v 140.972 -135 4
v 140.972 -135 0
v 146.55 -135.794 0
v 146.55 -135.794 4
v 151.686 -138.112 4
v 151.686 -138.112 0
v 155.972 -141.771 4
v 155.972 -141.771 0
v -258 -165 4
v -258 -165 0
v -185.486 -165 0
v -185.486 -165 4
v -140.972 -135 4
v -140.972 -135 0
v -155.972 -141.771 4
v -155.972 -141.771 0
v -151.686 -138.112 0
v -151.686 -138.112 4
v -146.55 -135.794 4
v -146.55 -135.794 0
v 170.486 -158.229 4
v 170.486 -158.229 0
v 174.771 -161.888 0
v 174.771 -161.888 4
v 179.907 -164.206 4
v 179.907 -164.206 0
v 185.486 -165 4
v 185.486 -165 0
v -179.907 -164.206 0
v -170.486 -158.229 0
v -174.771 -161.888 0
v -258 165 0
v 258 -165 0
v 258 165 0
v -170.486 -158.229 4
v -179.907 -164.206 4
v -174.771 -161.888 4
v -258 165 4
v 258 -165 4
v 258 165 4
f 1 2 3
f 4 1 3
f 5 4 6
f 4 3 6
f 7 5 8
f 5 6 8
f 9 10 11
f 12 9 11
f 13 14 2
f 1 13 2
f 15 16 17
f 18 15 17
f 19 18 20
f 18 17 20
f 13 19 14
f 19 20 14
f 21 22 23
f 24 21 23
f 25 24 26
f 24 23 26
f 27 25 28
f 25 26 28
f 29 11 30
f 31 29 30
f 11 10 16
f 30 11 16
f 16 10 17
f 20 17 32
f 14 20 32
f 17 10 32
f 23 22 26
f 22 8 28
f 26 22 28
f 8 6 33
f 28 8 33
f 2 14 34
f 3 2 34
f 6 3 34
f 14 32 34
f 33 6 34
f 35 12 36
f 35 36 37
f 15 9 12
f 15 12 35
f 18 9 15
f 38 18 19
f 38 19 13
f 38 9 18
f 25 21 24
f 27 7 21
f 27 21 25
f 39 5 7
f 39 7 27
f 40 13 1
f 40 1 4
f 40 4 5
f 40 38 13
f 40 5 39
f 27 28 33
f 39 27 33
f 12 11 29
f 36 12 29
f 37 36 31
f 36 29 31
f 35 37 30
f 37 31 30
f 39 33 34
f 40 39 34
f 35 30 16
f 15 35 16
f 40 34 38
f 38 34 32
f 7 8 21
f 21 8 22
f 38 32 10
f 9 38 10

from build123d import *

# Parameters (mm, degrees)
BOSS_EXTRUDE1_DEPTH = 4


with BuildPart() as part:
    # Sketch1 → Boss-Extrude1 (new body)
    with BuildSketch(Plane.XY):
        with BuildLine():
            Line((-170.485837704, -158.228756555), (-155.971675407, -141.771243445))
            ThreePointArc((-155.971675407, -141.771243445), (-149.200431962, -136.771243445), (-140.971675407, -135))
            Line((-140.971675407, -135), (140.971675407, -135))
            ThreePointArc((140.971675407, -135), (149.200431962, -136.771243445), (155.971675407, -141.771243445))
            Line((155.971675407, -141.771243445), (170.485837704, -158.228756555))
            ThreePointArc((170.485837704, -158.228756555), (177.257081148, -163.228756555), (185.485837704, -165))
            Line((185.485837704, -165), (258, -165))
            Line((258, -165), (258, 165))
            Line((258, 165), (-258, 165))
            Line((-258, 165), (-258, -165))
            Line((-258, -165), (-185.485837704, -165))
            ThreePointArc((-185.485837704, -165), (-177.257081148, -163.228756555), (-170.485837704, -158.228756555))
        make_face()
    extrude(amount=BOSS_EXTRUDE1_DEPTH)


solid = part.part
